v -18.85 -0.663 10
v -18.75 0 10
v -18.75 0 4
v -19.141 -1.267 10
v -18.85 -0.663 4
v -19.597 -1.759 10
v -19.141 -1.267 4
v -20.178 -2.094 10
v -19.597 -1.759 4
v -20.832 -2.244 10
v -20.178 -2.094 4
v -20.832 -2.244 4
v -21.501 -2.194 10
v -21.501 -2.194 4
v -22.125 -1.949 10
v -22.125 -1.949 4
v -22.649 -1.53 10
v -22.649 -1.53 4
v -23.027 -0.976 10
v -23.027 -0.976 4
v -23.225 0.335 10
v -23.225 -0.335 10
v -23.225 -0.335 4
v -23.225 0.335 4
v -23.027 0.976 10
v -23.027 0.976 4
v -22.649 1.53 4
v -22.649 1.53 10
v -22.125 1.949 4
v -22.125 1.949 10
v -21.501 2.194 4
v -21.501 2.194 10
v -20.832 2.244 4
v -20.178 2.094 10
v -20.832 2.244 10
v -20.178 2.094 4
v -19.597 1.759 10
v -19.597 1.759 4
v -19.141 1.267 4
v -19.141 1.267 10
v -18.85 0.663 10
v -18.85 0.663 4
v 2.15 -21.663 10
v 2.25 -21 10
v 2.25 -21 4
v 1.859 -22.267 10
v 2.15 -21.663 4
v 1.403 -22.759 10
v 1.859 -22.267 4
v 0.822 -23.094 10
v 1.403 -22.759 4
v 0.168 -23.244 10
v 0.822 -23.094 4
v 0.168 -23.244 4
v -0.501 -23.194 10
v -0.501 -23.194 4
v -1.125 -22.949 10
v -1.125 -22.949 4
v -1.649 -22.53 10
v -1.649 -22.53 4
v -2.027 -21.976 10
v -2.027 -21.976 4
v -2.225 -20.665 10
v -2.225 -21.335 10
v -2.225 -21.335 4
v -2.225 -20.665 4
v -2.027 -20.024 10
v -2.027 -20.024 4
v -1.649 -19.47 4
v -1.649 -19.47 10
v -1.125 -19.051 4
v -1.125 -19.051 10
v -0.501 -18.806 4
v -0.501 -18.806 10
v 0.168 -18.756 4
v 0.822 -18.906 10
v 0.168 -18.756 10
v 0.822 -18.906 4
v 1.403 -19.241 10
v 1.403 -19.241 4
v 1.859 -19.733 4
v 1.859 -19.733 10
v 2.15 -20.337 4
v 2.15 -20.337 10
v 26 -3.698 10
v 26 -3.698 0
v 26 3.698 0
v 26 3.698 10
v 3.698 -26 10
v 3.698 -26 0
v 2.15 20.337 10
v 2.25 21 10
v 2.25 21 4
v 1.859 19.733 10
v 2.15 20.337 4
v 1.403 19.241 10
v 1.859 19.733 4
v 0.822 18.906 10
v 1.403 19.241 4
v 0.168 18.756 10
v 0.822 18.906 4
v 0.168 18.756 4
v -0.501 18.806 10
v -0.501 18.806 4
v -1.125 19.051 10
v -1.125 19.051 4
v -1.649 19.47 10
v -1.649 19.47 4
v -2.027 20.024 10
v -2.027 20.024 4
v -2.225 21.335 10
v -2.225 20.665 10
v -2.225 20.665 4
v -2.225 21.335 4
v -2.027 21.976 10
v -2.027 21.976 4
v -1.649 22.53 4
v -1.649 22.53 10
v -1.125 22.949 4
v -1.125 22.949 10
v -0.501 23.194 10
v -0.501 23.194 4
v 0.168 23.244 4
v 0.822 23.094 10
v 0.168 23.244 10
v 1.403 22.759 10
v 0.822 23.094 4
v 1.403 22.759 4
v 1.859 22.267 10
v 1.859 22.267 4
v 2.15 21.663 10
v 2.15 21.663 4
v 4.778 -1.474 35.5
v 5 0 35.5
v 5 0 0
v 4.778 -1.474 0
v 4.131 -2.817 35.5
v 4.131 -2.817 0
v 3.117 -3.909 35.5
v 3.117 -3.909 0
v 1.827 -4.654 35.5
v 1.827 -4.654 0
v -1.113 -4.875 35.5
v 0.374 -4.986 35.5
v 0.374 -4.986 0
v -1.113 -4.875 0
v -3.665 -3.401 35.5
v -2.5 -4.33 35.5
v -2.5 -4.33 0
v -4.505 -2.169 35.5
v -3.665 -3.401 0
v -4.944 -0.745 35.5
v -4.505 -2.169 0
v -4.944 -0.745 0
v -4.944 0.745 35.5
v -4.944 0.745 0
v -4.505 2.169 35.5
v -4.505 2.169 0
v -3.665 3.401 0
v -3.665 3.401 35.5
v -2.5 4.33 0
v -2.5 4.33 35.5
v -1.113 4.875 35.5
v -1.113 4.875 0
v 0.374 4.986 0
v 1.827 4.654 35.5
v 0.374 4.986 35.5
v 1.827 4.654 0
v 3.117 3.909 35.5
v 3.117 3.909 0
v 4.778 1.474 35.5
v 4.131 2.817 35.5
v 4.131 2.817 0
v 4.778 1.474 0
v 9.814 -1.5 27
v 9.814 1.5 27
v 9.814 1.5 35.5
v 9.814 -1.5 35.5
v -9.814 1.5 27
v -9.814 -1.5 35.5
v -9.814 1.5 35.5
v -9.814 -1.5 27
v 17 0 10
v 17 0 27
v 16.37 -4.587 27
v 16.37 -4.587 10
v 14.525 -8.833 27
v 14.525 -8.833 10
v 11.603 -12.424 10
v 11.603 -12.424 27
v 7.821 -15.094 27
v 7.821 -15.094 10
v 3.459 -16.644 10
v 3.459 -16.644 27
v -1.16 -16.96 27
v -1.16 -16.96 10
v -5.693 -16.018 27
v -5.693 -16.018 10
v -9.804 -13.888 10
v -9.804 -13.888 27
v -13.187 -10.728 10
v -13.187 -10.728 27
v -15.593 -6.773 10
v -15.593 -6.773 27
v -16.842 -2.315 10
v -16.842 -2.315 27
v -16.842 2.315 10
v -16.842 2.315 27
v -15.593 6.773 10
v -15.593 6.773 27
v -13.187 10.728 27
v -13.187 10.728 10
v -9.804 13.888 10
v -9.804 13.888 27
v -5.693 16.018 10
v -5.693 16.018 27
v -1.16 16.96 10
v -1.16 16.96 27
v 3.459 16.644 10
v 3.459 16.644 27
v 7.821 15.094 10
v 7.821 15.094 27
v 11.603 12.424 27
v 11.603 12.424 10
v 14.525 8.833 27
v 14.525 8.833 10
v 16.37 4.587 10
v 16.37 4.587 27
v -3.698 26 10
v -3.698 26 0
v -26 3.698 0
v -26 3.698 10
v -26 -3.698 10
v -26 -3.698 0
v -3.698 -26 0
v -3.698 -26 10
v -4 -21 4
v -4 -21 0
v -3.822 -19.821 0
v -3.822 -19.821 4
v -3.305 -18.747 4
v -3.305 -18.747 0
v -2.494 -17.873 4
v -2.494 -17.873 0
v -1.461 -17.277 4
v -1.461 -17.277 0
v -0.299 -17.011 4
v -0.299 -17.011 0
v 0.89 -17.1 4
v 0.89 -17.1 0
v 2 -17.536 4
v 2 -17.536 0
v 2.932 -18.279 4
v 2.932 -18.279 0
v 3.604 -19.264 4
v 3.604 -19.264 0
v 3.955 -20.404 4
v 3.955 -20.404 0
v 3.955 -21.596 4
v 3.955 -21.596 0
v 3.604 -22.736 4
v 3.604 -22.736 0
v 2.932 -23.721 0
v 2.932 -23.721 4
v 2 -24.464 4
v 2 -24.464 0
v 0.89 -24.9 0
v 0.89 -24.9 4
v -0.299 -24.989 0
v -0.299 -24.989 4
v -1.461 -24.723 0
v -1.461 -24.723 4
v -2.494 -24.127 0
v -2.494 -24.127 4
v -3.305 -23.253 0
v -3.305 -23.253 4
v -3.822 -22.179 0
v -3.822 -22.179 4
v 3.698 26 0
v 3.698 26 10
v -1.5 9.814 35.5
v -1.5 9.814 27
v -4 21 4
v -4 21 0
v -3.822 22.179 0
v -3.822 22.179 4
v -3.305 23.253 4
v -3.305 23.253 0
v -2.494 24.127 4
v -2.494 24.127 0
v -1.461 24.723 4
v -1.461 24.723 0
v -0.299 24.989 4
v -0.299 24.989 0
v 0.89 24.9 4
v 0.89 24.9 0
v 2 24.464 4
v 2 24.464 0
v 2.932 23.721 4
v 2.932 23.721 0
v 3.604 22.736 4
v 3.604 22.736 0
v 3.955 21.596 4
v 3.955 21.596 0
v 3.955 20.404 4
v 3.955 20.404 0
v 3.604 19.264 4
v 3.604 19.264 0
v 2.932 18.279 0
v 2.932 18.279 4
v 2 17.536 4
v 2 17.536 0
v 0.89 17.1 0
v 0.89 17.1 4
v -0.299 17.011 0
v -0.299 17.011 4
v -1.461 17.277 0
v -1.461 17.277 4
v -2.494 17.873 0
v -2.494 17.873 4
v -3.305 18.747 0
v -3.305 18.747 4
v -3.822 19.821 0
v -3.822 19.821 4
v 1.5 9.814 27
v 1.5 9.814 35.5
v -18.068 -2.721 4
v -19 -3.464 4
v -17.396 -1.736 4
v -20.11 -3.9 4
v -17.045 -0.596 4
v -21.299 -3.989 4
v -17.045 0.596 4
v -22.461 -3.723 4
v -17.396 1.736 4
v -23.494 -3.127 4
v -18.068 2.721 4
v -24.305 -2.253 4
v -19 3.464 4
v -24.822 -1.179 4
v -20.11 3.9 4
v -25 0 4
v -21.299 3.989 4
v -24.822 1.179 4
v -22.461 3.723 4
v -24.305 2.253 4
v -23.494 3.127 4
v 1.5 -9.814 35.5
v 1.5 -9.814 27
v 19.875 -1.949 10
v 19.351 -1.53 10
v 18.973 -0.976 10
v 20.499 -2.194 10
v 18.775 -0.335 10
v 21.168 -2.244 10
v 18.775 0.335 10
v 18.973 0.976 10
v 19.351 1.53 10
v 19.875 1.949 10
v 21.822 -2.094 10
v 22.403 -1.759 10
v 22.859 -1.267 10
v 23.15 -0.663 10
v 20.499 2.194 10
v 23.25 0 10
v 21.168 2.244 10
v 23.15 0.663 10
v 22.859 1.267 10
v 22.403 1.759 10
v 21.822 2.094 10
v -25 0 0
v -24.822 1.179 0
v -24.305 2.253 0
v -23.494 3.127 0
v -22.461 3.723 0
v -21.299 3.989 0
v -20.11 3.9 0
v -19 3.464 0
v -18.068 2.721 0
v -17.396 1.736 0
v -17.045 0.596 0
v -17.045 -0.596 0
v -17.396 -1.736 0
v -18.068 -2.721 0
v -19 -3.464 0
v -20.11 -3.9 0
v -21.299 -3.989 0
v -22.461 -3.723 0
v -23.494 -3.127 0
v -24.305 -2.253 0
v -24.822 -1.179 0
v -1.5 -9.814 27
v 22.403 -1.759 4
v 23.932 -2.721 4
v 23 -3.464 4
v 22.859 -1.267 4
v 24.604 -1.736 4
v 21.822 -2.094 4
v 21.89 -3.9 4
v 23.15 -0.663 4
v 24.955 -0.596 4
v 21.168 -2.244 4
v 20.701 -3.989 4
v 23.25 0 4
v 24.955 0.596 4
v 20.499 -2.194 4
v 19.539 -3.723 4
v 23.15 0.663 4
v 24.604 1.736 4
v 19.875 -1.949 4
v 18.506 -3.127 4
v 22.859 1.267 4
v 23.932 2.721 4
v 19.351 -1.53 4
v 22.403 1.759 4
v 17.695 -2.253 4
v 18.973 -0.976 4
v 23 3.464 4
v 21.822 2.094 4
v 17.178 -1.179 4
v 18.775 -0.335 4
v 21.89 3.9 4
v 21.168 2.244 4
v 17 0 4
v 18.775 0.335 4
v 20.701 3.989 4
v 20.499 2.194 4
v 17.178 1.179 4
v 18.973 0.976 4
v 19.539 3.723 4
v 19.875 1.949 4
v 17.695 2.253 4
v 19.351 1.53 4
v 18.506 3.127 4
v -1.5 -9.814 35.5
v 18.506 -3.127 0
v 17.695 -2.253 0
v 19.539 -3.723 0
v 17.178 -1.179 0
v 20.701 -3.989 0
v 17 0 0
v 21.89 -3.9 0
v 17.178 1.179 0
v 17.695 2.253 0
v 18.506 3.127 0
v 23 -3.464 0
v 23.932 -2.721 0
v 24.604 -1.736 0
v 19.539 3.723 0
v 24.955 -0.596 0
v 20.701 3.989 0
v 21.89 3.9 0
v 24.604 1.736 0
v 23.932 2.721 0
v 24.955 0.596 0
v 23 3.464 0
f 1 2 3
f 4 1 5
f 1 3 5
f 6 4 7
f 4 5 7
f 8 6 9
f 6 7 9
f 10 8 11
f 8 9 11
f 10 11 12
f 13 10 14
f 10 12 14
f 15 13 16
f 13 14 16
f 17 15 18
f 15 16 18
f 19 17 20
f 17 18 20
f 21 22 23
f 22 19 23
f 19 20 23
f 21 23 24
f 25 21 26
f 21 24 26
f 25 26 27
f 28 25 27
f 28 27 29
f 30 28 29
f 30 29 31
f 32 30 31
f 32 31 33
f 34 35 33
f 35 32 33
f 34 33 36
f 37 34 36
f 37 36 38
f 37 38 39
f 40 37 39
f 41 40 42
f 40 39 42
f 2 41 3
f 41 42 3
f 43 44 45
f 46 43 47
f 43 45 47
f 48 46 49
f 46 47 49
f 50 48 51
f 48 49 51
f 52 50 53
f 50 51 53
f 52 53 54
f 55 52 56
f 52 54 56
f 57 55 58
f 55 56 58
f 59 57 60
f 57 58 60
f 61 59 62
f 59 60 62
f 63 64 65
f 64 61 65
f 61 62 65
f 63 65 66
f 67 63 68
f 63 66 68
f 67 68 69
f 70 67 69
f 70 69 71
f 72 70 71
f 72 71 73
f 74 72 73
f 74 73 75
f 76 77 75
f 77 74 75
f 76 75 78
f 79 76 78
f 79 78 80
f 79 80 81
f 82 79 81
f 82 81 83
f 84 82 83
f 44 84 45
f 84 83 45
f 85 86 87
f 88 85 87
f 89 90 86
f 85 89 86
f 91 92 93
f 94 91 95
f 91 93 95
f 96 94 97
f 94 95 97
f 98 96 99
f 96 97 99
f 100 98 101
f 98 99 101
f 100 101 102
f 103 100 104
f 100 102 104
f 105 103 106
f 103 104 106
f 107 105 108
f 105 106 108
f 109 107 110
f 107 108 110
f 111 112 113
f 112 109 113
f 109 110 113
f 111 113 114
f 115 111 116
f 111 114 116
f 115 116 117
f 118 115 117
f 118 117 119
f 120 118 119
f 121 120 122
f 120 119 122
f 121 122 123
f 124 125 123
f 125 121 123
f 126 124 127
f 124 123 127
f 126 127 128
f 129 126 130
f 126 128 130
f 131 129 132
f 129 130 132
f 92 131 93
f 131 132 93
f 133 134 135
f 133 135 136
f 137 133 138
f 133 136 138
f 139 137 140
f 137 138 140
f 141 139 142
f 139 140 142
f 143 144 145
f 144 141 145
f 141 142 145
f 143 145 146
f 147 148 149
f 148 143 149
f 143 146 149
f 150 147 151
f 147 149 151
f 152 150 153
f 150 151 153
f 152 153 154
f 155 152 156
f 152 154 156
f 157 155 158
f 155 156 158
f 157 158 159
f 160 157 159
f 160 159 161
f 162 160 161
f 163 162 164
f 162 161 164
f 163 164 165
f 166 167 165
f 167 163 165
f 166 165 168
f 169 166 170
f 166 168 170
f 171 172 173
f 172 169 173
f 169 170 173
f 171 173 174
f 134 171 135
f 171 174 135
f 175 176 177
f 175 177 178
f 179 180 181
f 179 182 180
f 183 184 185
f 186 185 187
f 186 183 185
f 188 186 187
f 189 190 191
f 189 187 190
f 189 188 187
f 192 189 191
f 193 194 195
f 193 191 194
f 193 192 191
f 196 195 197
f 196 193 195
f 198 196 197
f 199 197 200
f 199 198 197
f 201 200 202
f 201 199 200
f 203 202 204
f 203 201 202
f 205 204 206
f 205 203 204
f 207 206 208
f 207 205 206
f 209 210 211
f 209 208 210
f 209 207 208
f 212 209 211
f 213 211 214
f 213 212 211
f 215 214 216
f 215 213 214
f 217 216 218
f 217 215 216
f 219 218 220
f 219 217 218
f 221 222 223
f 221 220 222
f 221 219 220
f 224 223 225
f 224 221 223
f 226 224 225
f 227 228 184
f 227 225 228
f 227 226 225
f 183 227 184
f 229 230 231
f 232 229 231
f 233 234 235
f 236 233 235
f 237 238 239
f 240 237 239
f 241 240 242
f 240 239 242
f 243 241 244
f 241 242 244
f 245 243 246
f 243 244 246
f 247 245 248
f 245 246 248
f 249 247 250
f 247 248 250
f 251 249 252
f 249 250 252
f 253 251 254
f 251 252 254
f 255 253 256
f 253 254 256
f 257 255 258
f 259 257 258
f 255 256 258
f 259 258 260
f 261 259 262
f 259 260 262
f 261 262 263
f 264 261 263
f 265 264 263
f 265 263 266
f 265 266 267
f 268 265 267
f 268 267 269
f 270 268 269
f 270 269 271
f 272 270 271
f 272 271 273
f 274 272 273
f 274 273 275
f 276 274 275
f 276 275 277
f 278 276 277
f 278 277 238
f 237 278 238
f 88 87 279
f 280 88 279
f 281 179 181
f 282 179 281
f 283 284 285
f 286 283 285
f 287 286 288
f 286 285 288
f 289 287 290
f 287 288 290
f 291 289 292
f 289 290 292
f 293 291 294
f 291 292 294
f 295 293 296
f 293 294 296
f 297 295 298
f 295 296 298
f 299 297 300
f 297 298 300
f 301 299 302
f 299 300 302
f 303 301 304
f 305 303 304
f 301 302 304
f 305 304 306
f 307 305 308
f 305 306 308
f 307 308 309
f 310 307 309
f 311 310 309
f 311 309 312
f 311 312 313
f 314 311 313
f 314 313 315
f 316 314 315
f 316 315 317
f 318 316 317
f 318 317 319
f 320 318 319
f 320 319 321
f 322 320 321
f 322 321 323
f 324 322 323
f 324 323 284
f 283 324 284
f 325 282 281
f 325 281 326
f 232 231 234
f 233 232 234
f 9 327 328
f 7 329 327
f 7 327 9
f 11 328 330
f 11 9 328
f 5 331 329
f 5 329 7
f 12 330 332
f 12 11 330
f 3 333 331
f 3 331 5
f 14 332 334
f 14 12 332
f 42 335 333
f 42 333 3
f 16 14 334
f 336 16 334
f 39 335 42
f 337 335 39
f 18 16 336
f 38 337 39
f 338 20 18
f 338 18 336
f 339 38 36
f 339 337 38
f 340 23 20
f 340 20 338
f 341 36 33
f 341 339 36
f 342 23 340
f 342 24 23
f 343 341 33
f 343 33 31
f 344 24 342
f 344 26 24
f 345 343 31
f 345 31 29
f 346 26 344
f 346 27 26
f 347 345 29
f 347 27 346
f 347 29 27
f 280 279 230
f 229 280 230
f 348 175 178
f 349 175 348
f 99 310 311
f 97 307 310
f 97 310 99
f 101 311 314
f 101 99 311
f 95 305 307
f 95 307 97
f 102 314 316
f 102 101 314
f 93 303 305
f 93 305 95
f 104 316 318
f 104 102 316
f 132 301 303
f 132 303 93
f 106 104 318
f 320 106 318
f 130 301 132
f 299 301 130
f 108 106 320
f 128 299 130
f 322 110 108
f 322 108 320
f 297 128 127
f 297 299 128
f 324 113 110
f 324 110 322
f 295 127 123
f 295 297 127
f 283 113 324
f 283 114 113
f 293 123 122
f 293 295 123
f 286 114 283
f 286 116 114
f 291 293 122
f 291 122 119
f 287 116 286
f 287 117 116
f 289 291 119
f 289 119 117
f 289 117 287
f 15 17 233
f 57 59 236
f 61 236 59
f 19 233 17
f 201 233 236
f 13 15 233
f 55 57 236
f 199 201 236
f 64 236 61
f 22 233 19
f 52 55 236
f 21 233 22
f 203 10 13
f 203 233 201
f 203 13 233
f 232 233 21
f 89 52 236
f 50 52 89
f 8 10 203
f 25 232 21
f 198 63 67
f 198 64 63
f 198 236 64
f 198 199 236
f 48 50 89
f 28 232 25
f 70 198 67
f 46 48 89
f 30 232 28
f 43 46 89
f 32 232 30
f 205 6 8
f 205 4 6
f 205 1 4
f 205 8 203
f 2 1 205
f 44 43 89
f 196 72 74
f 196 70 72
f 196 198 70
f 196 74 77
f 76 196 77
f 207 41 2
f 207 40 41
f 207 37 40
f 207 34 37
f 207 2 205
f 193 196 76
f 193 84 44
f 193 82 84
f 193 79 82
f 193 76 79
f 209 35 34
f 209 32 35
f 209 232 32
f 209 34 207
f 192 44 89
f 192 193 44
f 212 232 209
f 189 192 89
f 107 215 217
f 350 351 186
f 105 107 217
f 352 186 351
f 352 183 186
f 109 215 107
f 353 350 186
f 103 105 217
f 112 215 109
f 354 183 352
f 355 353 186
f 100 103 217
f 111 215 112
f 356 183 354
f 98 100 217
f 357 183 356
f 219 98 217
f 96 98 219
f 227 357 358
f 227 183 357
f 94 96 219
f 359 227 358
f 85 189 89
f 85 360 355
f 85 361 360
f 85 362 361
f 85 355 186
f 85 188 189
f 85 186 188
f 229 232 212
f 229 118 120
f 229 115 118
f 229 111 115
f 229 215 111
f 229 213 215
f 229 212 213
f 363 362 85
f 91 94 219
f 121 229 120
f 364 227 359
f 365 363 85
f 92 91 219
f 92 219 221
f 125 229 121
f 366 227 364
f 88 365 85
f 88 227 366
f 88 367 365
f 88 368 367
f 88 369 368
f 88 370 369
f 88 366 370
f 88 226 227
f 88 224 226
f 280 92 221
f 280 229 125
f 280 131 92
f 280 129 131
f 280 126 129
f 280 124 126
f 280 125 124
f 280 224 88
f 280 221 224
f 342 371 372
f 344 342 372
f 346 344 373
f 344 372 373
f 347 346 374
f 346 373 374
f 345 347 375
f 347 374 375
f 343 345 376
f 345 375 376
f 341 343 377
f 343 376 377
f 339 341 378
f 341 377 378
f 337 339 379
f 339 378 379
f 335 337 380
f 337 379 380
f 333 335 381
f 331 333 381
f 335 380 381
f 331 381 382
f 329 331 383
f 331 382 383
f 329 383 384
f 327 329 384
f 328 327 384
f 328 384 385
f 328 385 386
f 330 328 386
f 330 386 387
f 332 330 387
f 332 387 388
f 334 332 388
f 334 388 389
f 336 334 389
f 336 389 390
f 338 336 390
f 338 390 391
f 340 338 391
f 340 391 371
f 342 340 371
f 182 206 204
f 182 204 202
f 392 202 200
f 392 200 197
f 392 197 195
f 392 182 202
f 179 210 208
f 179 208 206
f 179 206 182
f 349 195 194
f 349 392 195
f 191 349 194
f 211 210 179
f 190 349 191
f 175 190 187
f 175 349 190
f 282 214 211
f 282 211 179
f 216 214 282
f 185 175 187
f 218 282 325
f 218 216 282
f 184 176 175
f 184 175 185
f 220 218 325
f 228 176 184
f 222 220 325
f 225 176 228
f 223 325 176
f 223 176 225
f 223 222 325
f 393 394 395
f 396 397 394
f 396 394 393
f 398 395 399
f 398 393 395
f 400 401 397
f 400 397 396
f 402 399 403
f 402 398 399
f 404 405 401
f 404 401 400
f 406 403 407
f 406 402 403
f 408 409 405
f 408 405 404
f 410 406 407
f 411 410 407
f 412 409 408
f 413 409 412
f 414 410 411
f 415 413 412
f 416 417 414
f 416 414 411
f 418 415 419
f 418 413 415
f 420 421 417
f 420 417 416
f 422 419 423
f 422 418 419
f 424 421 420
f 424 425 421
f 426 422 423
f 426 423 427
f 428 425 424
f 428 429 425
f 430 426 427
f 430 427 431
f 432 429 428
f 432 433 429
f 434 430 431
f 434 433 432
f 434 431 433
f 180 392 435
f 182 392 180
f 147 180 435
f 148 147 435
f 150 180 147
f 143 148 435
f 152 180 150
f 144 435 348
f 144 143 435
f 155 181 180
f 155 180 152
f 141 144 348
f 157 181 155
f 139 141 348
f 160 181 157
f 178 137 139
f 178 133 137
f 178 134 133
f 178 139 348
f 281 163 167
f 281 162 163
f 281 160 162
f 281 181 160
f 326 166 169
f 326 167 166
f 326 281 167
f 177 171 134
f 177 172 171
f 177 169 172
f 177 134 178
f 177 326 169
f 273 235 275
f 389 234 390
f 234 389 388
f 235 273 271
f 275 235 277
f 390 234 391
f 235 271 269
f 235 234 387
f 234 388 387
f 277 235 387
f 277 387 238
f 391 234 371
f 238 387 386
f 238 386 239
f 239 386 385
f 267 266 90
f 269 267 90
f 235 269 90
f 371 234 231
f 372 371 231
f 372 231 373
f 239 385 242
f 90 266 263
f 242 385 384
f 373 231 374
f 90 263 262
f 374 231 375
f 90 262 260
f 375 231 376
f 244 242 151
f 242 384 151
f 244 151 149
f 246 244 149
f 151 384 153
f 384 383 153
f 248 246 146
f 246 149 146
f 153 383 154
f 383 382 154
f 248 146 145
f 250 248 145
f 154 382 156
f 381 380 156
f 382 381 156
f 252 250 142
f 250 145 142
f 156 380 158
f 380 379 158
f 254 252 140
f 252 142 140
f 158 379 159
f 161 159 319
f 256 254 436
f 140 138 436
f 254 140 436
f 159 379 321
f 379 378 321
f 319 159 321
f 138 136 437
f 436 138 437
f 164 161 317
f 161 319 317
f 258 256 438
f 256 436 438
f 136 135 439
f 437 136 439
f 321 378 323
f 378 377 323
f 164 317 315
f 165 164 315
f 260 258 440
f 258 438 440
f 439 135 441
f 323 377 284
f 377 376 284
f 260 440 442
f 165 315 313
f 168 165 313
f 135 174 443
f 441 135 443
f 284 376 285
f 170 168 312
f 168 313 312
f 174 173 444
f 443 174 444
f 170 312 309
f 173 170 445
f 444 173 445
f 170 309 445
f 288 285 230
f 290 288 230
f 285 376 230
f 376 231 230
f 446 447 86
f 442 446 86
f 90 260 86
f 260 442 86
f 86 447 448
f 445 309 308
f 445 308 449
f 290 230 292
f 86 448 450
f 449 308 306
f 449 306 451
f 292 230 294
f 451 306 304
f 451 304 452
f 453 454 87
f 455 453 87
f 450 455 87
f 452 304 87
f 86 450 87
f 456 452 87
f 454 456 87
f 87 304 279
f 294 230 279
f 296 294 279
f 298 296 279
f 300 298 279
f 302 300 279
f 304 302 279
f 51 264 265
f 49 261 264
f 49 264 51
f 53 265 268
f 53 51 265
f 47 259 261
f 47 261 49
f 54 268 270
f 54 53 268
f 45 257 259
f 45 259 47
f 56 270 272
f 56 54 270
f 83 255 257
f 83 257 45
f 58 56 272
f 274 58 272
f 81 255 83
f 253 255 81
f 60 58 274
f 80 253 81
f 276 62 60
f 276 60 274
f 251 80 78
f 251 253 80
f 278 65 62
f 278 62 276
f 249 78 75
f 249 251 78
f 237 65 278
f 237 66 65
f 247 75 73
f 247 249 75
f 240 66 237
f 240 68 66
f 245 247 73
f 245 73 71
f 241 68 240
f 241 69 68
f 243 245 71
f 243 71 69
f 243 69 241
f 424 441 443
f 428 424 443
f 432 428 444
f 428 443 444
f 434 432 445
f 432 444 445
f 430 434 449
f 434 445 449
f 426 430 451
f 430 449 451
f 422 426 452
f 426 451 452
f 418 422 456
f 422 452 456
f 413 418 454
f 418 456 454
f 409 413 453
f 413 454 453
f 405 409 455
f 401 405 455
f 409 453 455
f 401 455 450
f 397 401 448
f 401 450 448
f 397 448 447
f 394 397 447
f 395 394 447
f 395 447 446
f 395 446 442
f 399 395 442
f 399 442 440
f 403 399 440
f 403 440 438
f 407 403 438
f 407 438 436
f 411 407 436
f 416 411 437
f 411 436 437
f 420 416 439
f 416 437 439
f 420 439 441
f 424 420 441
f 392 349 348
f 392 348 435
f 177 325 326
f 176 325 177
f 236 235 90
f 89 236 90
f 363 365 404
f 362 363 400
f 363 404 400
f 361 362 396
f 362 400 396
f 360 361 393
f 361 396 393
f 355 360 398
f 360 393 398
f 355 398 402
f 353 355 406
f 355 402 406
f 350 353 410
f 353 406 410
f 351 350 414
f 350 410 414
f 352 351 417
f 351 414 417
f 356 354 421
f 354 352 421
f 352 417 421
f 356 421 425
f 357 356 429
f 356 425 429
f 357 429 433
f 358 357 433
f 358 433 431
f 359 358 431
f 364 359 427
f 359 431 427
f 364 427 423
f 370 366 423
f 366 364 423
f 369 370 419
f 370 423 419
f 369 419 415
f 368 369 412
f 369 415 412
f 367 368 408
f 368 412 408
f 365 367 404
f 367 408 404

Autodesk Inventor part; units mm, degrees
ref_plane "YZ Plane" through (0, 0, 0) normal (1, 0, 0) x (0, 1, 0)
ref_plane "XZ Plane" through (0, 0, 0) normal (0, 1, 0) x (-1, 0, 0)
ref_plane "XY Plane" through (0, 0, 0) normal (0, 0, 1) x (1, 0, 0)
sketch "Sketch1" plane through (0, 0, 0) normal (0, 0, 1) x (1, 0, 0)
  line L0 (-26, -3.6985) -> (-3.6985, -26)
  line L1 (-3.6985, -26) -> (3.6985, -26)
  line L2 (3.6985, -26) -> (26, -3.6985)
  line L3 (26, -3.6985) -> (26, 3.6985)
  line L4 (26, 3.6985) -> (3.6985, 26)
  line L5 (3.6985, 26) -> (-3.6985, 26)
  line L6 (-3.6985, 26) -> (-26, 3.6985)
  line L7 (-26, 3.6985) -> (-26, -3.6985)
  circle A0 centre (0, 0) radius 5
  line L8 (-21, 0) -> (0, -21) construction
  line L9 (0, -21) -> (21, 0) construction
  line L10 (21, 0) -> (0, 21) construction
  line L11 (0, 21) -> (-21, 0) construction
  circle A1 centre (0, 21) radius 2.25
  circle A2 centre (-21, 0) radius 2.25
  circle A3 centre (0, -21) radius 2.25
  circle A4 centre (21, 0) radius 2.25
  point P0 (0, 26)
  point P1 (26, 0)
  dimension "d0" = 10
  dimension "d1" = 42
  dimension "d2" = 135
  dimension "d3" = 42
  dimension "d4" = 4.5
  dimension "d5" = 52
extrude "Extrusion1" add sketch "Sketch1" along normal blind 10
sketch "Sketch2" plane through (0, 0, 10) normal (0, 0, 1) x (1, 0, 0)
  circle A0 centre (0, 0) radius 5 projected
  circle A1 centre (0, 0) radius 17
  dimension "d8" = 34
extrude "Extrusion2" add sketch "Sketch2" along normal blind 17
sketch "Sketch3" plane through (0, 0, 0) normal (0, 0, -1) x (-1, 0, 0)
  circle A0 centre (0, 21) radius 4
  circle A1 centre (21, 0) radius 4
  circle A2 centre (0, -21) radius 4
  circle A3 centre (-21, 0) radius 4
  circle A4 centre (0, 21) radius 2.25 projected
  circle A5 centre (-21, 0) radius 2.25 projected
  circle A6 centre (21, 0) radius 2.25 projected
  circle A7 centre (0, -21) radius 2.25 projected
  point P0 (0, 0)
  dimension "d11" = 8
extrude "Extrusion3" cut sketch "Sketch3" against normal blind 4 contours A0 | A1 | A2 | A3 | A4 | A5 | A6 | A7
sketch "Sketch5" plane through (0, 0, 27) normal (0, 0, 1) x (1, 0, 0)
  line L0 (-9.8137, 1.5) -> (-1.5, 9.8137)
  line L1 (-1.5, 9.8137) -> (1.5, 9.8137)
  line L2 (1.5, 9.8137) -> (9.8137, 1.5)
  line L3 (9.8137, 1.5) -> (9.8137, -1.5)
  line L4 (9.8137, -1.5) -> (1.5, -9.8137)
  line L5 (1.5, -9.8137) -> (-1.5, -9.8137)
  line L6 (-1.5, -9.8137) -> (-9.8137, -1.5)
  line L7 (-9.8137, -1.5) -> (-9.8137, 1.5)
  circle A0 centre (0, 0) radius 5
  point P0 (9.8137, 0)
  point P1 (-9.8137, 0)
  point P2 (0, 9.8137)
  point P3 (0, -9.8137)
  dimension "d14" = 16
  dimension "d15" = 3
  dimension "d16" = 10
extrude "Extrusion4" add sketch "Sketch5" along normal blind 8.5
properties part number "FK10"
